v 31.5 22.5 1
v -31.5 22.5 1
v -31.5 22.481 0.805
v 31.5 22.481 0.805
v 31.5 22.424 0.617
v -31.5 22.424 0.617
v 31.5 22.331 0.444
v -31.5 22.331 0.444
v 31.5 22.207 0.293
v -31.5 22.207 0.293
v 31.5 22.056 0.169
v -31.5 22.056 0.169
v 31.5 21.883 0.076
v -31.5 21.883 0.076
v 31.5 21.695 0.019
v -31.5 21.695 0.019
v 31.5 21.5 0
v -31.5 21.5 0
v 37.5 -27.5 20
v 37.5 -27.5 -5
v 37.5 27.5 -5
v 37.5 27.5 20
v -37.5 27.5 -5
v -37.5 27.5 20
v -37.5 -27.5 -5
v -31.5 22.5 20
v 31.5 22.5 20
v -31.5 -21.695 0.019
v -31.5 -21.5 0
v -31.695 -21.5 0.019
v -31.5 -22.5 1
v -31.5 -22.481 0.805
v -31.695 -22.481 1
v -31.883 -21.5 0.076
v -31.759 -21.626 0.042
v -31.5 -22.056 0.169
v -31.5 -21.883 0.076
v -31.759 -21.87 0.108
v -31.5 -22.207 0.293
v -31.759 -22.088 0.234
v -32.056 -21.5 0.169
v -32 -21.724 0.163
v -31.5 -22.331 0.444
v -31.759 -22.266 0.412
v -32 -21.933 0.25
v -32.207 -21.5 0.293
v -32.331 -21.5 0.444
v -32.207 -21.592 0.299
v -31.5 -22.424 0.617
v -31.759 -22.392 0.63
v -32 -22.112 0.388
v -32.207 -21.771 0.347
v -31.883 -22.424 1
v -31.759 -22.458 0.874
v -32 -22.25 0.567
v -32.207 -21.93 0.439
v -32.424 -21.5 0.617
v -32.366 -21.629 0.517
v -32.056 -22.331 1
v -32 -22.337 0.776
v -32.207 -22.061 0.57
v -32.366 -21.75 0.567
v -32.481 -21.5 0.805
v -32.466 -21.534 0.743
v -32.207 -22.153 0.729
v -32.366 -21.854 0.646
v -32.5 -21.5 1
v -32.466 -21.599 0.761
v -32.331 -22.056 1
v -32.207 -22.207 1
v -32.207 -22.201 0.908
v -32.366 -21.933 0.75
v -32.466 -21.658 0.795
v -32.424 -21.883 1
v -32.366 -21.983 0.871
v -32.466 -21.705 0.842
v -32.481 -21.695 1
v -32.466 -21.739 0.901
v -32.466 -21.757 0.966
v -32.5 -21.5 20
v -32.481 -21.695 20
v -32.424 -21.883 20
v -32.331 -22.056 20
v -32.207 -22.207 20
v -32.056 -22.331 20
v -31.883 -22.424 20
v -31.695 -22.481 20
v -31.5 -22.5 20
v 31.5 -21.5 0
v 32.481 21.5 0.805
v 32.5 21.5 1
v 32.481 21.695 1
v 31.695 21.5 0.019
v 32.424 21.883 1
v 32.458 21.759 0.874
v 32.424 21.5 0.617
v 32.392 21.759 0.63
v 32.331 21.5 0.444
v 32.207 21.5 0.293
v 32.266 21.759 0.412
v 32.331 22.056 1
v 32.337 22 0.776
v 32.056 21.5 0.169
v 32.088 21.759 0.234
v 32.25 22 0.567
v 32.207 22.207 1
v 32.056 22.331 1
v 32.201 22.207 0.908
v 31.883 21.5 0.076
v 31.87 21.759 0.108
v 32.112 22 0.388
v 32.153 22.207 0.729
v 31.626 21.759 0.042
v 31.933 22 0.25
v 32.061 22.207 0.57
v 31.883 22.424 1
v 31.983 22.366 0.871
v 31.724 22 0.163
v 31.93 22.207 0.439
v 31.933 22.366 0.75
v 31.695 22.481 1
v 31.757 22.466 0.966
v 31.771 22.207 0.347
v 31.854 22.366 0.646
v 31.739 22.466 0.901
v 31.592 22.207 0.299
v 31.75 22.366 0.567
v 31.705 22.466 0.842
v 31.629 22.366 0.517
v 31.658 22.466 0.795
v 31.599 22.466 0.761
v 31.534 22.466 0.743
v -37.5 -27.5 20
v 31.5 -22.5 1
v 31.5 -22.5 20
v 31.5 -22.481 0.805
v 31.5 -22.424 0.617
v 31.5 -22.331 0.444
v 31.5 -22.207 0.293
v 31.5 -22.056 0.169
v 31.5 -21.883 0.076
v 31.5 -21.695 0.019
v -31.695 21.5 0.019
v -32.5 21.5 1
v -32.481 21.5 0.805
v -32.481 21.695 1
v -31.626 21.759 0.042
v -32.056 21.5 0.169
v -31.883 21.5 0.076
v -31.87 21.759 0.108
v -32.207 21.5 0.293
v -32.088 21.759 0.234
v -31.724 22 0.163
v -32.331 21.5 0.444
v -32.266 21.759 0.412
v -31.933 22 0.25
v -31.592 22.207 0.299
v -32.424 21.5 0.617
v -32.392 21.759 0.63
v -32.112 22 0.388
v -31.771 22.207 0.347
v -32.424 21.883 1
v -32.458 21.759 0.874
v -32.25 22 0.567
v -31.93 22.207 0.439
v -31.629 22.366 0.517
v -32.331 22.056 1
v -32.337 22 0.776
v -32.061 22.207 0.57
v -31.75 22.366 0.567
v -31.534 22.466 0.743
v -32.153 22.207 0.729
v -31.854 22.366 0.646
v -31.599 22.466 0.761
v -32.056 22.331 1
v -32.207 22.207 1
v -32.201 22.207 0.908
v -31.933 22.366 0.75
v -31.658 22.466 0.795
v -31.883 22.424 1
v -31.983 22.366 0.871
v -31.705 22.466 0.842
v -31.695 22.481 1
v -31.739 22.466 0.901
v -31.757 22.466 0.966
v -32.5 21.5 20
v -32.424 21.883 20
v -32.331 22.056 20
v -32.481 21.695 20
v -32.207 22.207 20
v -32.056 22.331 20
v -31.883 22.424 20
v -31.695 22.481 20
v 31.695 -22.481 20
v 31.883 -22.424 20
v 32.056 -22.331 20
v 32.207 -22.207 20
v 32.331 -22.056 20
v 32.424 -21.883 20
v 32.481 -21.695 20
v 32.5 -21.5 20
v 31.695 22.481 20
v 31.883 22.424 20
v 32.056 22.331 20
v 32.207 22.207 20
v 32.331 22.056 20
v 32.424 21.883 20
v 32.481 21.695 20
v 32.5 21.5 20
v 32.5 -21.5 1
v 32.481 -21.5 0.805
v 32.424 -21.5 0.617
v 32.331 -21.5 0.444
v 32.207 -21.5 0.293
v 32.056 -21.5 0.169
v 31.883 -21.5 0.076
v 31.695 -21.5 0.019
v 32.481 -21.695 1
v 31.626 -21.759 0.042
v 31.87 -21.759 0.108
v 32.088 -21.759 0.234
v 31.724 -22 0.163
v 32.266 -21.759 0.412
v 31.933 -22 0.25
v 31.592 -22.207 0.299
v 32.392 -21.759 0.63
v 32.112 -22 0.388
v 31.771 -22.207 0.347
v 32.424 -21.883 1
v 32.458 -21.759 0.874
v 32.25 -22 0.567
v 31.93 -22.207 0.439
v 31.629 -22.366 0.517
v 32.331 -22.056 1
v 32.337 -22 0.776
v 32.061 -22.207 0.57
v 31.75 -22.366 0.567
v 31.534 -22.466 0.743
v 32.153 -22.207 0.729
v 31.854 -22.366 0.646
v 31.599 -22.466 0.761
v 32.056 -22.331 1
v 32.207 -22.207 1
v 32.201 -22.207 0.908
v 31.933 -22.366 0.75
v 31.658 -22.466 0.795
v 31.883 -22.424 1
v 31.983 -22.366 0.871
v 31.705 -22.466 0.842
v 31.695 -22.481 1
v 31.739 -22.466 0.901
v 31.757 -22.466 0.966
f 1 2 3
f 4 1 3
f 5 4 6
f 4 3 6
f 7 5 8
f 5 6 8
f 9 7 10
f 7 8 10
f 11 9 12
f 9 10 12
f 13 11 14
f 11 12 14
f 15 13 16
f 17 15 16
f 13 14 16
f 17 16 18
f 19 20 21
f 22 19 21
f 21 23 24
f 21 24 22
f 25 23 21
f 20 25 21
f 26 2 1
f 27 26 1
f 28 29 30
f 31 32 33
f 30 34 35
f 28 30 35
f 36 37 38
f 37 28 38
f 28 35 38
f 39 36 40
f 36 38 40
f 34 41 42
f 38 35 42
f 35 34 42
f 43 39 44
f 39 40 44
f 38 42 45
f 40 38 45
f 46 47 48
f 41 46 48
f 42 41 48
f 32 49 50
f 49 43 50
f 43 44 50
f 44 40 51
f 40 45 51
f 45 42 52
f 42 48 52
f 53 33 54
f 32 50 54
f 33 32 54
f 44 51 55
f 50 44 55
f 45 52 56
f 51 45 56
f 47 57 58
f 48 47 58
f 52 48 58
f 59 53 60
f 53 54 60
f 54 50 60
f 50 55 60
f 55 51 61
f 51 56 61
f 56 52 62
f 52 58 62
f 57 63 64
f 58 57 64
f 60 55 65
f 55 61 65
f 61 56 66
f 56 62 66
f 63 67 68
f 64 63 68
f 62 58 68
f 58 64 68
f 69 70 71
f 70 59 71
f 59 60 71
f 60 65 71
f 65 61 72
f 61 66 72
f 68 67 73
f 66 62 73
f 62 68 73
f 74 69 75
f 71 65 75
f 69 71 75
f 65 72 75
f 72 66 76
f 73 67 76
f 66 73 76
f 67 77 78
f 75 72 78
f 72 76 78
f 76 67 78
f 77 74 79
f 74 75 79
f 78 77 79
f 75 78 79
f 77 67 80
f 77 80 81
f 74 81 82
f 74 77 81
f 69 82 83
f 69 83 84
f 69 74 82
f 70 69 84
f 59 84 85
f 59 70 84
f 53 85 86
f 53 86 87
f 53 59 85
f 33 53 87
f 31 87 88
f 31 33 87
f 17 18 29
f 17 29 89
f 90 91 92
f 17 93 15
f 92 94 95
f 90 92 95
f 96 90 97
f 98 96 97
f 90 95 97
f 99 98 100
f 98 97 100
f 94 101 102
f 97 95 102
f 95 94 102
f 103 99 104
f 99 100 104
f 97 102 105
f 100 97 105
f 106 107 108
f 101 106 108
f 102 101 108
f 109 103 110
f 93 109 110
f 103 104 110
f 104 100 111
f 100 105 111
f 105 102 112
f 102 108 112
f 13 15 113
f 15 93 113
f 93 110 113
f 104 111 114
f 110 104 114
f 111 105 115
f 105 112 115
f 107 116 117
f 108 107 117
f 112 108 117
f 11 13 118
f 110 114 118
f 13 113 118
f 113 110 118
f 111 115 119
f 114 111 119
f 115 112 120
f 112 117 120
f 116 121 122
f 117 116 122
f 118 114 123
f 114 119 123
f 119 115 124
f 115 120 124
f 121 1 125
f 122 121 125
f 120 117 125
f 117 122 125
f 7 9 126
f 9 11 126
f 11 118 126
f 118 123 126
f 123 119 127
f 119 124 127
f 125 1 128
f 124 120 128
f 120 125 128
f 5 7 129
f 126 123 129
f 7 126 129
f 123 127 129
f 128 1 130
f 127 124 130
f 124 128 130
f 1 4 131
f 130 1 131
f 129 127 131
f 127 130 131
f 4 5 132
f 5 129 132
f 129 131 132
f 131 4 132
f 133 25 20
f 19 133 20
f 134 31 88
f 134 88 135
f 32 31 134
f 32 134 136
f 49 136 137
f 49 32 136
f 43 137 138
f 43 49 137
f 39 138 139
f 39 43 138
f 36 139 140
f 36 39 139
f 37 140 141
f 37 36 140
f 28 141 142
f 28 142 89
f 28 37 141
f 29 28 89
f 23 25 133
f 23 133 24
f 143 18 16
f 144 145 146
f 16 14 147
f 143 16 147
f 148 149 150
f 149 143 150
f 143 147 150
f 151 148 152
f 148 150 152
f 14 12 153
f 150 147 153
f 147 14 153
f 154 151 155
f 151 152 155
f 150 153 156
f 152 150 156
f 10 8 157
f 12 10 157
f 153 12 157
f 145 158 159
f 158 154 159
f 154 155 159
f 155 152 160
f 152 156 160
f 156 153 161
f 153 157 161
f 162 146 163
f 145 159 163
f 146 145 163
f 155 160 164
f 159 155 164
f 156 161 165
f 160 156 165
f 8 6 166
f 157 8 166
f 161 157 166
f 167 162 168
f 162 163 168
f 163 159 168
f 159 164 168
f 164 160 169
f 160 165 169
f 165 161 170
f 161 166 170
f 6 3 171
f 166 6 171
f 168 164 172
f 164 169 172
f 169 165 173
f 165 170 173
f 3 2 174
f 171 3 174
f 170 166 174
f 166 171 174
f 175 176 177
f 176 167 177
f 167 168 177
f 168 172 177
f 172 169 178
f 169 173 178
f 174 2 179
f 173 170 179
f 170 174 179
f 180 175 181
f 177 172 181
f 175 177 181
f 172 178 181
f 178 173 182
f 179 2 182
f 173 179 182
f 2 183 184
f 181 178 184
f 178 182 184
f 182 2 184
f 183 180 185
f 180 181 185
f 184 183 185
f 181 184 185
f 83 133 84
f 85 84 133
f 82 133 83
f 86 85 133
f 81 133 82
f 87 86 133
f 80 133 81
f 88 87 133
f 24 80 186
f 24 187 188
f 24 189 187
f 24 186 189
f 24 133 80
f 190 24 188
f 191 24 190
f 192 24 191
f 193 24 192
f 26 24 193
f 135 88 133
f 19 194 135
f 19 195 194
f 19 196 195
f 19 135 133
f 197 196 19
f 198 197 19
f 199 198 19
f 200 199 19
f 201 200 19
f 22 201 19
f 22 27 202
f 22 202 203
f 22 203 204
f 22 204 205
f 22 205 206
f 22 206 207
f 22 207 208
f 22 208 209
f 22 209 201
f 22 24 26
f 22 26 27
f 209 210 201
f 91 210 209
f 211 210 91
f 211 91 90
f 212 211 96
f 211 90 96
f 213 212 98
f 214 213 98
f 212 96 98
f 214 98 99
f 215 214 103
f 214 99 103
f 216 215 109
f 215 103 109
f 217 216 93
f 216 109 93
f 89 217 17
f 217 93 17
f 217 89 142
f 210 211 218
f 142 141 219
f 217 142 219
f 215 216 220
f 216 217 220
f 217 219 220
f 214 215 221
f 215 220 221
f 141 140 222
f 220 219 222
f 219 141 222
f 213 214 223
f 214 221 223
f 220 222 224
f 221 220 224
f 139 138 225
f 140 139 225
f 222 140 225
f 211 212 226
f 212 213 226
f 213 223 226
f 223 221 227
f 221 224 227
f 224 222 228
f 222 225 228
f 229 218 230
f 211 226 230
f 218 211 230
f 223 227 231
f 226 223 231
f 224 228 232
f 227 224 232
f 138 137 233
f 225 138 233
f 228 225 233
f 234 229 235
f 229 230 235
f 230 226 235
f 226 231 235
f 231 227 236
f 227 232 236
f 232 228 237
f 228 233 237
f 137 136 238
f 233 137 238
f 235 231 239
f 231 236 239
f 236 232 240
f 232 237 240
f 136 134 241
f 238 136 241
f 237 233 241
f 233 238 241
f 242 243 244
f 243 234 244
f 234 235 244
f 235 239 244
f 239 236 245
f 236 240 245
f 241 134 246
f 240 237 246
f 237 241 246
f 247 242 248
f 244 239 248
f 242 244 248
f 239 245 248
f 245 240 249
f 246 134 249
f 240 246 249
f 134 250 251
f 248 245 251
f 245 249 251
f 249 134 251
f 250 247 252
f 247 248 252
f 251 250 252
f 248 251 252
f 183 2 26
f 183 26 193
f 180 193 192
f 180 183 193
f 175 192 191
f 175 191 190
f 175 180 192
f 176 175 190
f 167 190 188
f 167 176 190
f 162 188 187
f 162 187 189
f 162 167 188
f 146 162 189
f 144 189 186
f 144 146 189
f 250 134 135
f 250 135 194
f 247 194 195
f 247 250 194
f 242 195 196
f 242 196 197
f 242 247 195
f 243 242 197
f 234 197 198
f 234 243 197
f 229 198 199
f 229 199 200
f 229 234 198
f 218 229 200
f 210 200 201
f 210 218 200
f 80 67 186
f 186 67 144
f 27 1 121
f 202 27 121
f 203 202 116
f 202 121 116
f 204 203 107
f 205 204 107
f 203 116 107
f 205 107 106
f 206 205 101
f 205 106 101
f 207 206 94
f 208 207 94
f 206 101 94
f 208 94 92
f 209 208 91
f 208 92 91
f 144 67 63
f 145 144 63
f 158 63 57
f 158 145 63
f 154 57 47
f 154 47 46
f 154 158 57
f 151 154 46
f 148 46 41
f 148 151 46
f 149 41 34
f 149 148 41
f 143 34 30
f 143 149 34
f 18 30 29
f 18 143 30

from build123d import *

# Parameters (mm, degrees)
F0_W         = 65
F0_H         = 45
F1_DEPTH     = 20
F2_T         = 5
F3_T1_DEPTH  = 19
F3_T3_DEPTH  = 63
F3_T5_DEPTH  = 43
F3_S9_W      = 1
F3_S9_H      = 1
F3_T10_DEPTH = 1
F3_S15_W     = 1
F3_S15_H     = 1
F3_T16_DEPTH = 1
F3_S21_W     = 1
F3_S21_H     = 1
F3_T22_DEPTH = 1
F3_S27_W     = 1
F3_S27_H     = 1
F3_T28_DEPTH = 1


# Not quite as in the source:
# - a fillet or chamfer that OpenCascade refuses, or shapes differently, is made with other operations: its cross-section is extruded or revolved along the edge and cut away or added


with BuildPart() as f1:
    # F0 (on Top) → F1 (new body)
    with BuildSketch(Plane.XY):
        Rectangle(F0_W, F0_H)
    extrude(amount=F1_DEPTH)

    # F2
    f2_openings = [f1.faces().sort_by_distance(p)[0] for p in [
        (0, 0, 20),
    ]]
    offset(amount=F2_T, openings=f2_openings, kind=Kind.INTERSECTION)

    # F3: fillet of radius 1 on 8 edges, made by hand

    # F3_s2 → F3_t1 (join)
    with BuildSketch(Plane.XY.offset(1)):
        with BuildLine():
            ThreePointArc((31.5, 22.5), (32.2071067812, 22.2071067812), (32.5, 21.5))
            Line((32.5, 21.5), (32.5, 22.5))
            Line((32.5, 22.5), (31.5, 22.5))
        make_face()
        with BuildLine():
            ThreePointArc((-31.5, 22.5), (-32.2071067812, 22.2071067812), (-32.5, 21.5))
            Line((-32.5, 21.5), (-32.5, 22.5))
            Line((-32.5, 22.5), (-31.5, 22.5))
        make_face()
        with BuildLine():
            ThreePointArc((-32.5, -21.5), (-32.2071067812, -22.2071067812), (-31.5, -22.5))
            Line((-31.5, -22.5), (-32.5, -22.5))
            Line((-32.5, -22.5), (-32.5, -21.5))
        make_face()
        with BuildLine():
            ThreePointArc((31.5, -22.5), (32.2071067812, -22.2071067812), (32.5, -21.5))
            Line((32.5, -21.5), (32.5, -22.5))
            Line((32.5, -22.5), (31.5, -22.5))
        make_face()
    extrude(amount=F3_T1_DEPTH)

    # F3_s4 → F3_t3 (join)
    with BuildSketch(Plane.YZ.offset(-31.5)):
        with BuildLine():
            ThreePointArc((22.5, 1), (22.2071067812, 0.2928932188), (21.5, 0))
            Line((21.5, 0), (22.5, 0))
            Line((22.5, 0), (22.5, 1))
        make_face()
        with BuildLine():
            ThreePointArc((-22.5, 1), (-22.2071067812, 0.2928932188), (-21.5, 0))
            Line((-21.5, 0), (-22.5, 0))
            Line((-22.5, 0), (-22.5, 1))
        make_face()
    extrude(amount=F3_T3_DEPTH)

    # F3_s6 → F3_t5 (join)
    with BuildSketch(Plane.XZ.offset(-21.5)):
        with BuildLine():
            ThreePointArc((-32.5, 1), (-32.2071067812, 0.2928932188), (-31.5, 0))
            Line((-31.5, 0), (-32.5, 0))
            Line((-32.5, 0), (-32.5, 1))
        make_face()
        with BuildLine():
            ThreePointArc((32.5, 1), (32.2071067812, 0.2928932188), (31.5, 0))
            Line((31.5, 0), (32.5, 0))
            Line((32.5, 0), (32.5, 1))
        make_face()
    extrude(amount=F3_T5_DEPTH)


with BuildPart() as f3_tool8:
    # F3_s9 → F3_t10 (new body)
    with BuildSketch(Plane.XZ.offset(-21.5)):
        with Locations((32, 0.5)):
            Rectangle(F3_S9_W, F3_S9_H)
    extrude(amount=-F3_T10_DEPTH)

    # F3_s11 → F3_t12 (revolve, cut)
    with BuildSketch(Plane(origin=(31.5, 21.5, 1), x_dir=(-0.7071067812, 0, 0.7071067812), z_dir=(-0.7071067812, 0, -0.7071067812))):
        with BuildLine():
            ThreePointArc((0, -1), (1, 0), (0, 1))
            Line((0, 1), (0, -1))
        make_face()
    revolve(axis=Axis((31.5, 21.5, 1), (0, 1, 0)), mode=Mode.SUBTRACT)


with BuildPart() as f1_1:
    add(f1.part)

    # F3_t7: union F3_tool8
    add(f3_tool8.part)


with BuildPart() as f3_tool14:
    # F3_s15 → F3_t16 (new body)
    with BuildSketch(Plane.XZ.offset(-21.5)):
        with Locations((-32, 0.5)):
            Rectangle(F3_S15_W, F3_S15_H)
    extrude(amount=-F3_T16_DEPTH)

    # F3_s17 → F3_t18 (revolve, cut)
    with BuildSketch(Plane(origin=(-31.5, 21.5, 1), x_dir=(0.7071067812, 0, 0.7071067812), z_dir=(-0.7071067812, 0, 0.7071067812))):
        with BuildLine():
            ThreePointArc((0, -1), (1, 0), (0, 1))
            Line((0, 1), (0, -1))
        make_face()
    revolve(axis=Axis((-31.5, 21.5, 1), (0, 1, 0)), mode=Mode.SUBTRACT)


with BuildPart() as f1_2:
    add(f1_1.part)

    # F3_t13: union F3_tool14
    add(f3_tool14.part)


with BuildPart() as f3_tool20:
    # F3_s21 → F3_t22 (new body)
    with BuildSketch(Plane.YZ.offset(-31.5)):
        with Locations((-22, 0.5)):
            Rectangle(F3_S21_W, F3_S21_H)
    extrude(amount=-F3_T22_DEPTH)

    # F3_s23 → F3_t24 (revolve, cut)
    with BuildSketch(Plane(origin=(-31.5, -21.5, 1), x_dir=(0, 0.7071067812, 0.7071067812), z_dir=(0, -0.7071067812, 0.7071067812))):
        with BuildLine():
            ThreePointArc((0, -1), (1, 0), (0, 1))
            Line((0, 1), (0, -1))
        make_face()
    revolve(axis=Axis((-31.5, -21.5, 1), (-1, 0, 0)), mode=Mode.SUBTRACT)


with BuildPart() as f1_3:
    add(f1_2.part)

    # F3_t19: union F3_tool20
    add(f3_tool20.part)


with BuildPart() as f3_tool26:
    # F3_s27 → F3_t28 (new body)
    with BuildSketch(Plane.XZ.offset(21.5)):
        with Locations((32, 0.5)):
            Rectangle(F3_S27_W, F3_S27_H)
    extrude(amount=F3_T28_DEPTH)

    # F3_s29 → F3_t30 (revolve, cut)
    with BuildSketch(Plane(origin=(31.5, -21.5, 1), x_dir=(-0.7071067812, 0, 0.7071067812), z_dir=(0.7071067812, 0, 0.7071067812))):
        with BuildLine():
            ThreePointArc((0, -1), (1, 0), (0, 1))
            Line((0, 1), (0, -1))
        make_face()
    revolve(axis=Axis((31.5, -21.5, 1), (0, -1, 0)), mode=Mode.SUBTRACT)


with BuildPart() as f1_4:
    add(f1_3.part)

    # F3_t25: union F3_tool26
    add(f3_tool26.part)


solid = f1_4.part
